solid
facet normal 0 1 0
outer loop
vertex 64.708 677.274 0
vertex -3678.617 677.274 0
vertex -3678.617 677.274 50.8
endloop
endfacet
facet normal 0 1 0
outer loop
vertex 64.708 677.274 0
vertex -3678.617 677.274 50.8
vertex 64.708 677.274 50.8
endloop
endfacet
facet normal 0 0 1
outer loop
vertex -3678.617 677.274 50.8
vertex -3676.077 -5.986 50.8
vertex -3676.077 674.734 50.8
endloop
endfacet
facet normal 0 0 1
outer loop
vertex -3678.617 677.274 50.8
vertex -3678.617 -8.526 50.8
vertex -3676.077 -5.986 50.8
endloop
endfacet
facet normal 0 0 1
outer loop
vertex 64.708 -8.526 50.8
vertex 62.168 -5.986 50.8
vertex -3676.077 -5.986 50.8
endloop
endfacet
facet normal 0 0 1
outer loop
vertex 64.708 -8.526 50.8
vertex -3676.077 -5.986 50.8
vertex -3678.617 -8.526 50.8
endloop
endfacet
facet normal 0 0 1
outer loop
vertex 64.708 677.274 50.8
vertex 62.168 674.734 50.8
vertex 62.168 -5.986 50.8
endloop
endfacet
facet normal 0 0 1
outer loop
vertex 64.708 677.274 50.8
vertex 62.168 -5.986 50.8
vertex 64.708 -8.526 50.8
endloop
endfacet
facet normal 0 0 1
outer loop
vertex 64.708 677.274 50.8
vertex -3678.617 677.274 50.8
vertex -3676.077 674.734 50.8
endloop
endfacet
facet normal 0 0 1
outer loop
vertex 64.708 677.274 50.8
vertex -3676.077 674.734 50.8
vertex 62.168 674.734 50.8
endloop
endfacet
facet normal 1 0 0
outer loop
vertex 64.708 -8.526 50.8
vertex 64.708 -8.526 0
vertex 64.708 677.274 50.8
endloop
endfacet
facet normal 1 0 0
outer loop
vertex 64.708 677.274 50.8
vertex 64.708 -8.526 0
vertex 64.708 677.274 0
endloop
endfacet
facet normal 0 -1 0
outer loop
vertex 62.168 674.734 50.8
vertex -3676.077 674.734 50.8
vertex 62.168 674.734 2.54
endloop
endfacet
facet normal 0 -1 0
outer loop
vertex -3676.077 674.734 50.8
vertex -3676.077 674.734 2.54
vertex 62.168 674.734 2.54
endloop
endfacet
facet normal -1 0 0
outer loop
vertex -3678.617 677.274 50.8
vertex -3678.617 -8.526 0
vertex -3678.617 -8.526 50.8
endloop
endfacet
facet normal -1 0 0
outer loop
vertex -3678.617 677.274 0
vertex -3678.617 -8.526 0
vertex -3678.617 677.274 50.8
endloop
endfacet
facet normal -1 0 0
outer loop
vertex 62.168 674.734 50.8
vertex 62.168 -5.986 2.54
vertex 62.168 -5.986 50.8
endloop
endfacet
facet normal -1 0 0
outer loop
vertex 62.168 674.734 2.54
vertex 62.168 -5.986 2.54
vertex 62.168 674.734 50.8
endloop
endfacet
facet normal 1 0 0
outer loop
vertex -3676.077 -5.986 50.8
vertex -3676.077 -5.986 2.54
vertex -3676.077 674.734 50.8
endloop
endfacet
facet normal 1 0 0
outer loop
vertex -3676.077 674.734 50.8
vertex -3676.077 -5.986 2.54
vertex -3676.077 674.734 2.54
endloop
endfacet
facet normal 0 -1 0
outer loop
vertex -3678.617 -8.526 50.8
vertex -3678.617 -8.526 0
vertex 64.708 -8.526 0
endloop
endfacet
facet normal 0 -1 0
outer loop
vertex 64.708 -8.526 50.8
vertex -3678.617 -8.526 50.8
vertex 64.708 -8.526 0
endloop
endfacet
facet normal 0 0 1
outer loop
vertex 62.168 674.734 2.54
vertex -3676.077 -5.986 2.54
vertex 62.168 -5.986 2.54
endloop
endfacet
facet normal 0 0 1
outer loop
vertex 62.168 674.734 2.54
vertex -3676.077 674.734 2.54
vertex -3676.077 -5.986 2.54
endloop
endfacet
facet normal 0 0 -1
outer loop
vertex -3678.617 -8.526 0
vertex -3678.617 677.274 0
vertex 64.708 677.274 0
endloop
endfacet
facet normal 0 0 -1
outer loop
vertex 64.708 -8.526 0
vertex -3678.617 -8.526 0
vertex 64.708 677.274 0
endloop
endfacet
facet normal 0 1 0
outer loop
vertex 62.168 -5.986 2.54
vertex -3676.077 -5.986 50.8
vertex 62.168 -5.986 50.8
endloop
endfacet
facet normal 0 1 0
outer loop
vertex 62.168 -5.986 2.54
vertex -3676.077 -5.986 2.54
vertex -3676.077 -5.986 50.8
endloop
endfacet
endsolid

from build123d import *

# Parameters (mm, degrees)
F0_W     = 3743.325
F0_H     = 685.8
F0_W_2   = 3740.277
F0_H_2   = 682.752
F1_DEPTH = 50.8
F3_T     = -2.54


# Not quite as in the source:
# - the program builds the solid bodies; features that only make, move or delete a surface that nothing else refers to are left out


with BuildPart() as f1:
    # F0 (on Top) → F1 (new body)
    with BuildSketch(Plane.XY):
        with Locations((-1806.9549600244, 334.3743443951)):
            Rectangle(F0_W, F0_H)
        with Locations((-1806.9549600244, 334.3743443951)):
            Rectangle(F0_W_2, F0_H_2, mode=Mode.SUBTRACT)
        with Locations((-1806.9549600244, 334.3743443951)):
            Rectangle(F0_W_2, F0_H_2)
    extrude(amount=F1_DEPTH)

    # F3
    f3_openings = [f1.faces().sort_by_distance(p)[0] for p in [
        (-1806.95496, 334.374344, 50.8),
    ]]
    offset(amount=F3_T, openings=f3_openings)


solid = f1.part
